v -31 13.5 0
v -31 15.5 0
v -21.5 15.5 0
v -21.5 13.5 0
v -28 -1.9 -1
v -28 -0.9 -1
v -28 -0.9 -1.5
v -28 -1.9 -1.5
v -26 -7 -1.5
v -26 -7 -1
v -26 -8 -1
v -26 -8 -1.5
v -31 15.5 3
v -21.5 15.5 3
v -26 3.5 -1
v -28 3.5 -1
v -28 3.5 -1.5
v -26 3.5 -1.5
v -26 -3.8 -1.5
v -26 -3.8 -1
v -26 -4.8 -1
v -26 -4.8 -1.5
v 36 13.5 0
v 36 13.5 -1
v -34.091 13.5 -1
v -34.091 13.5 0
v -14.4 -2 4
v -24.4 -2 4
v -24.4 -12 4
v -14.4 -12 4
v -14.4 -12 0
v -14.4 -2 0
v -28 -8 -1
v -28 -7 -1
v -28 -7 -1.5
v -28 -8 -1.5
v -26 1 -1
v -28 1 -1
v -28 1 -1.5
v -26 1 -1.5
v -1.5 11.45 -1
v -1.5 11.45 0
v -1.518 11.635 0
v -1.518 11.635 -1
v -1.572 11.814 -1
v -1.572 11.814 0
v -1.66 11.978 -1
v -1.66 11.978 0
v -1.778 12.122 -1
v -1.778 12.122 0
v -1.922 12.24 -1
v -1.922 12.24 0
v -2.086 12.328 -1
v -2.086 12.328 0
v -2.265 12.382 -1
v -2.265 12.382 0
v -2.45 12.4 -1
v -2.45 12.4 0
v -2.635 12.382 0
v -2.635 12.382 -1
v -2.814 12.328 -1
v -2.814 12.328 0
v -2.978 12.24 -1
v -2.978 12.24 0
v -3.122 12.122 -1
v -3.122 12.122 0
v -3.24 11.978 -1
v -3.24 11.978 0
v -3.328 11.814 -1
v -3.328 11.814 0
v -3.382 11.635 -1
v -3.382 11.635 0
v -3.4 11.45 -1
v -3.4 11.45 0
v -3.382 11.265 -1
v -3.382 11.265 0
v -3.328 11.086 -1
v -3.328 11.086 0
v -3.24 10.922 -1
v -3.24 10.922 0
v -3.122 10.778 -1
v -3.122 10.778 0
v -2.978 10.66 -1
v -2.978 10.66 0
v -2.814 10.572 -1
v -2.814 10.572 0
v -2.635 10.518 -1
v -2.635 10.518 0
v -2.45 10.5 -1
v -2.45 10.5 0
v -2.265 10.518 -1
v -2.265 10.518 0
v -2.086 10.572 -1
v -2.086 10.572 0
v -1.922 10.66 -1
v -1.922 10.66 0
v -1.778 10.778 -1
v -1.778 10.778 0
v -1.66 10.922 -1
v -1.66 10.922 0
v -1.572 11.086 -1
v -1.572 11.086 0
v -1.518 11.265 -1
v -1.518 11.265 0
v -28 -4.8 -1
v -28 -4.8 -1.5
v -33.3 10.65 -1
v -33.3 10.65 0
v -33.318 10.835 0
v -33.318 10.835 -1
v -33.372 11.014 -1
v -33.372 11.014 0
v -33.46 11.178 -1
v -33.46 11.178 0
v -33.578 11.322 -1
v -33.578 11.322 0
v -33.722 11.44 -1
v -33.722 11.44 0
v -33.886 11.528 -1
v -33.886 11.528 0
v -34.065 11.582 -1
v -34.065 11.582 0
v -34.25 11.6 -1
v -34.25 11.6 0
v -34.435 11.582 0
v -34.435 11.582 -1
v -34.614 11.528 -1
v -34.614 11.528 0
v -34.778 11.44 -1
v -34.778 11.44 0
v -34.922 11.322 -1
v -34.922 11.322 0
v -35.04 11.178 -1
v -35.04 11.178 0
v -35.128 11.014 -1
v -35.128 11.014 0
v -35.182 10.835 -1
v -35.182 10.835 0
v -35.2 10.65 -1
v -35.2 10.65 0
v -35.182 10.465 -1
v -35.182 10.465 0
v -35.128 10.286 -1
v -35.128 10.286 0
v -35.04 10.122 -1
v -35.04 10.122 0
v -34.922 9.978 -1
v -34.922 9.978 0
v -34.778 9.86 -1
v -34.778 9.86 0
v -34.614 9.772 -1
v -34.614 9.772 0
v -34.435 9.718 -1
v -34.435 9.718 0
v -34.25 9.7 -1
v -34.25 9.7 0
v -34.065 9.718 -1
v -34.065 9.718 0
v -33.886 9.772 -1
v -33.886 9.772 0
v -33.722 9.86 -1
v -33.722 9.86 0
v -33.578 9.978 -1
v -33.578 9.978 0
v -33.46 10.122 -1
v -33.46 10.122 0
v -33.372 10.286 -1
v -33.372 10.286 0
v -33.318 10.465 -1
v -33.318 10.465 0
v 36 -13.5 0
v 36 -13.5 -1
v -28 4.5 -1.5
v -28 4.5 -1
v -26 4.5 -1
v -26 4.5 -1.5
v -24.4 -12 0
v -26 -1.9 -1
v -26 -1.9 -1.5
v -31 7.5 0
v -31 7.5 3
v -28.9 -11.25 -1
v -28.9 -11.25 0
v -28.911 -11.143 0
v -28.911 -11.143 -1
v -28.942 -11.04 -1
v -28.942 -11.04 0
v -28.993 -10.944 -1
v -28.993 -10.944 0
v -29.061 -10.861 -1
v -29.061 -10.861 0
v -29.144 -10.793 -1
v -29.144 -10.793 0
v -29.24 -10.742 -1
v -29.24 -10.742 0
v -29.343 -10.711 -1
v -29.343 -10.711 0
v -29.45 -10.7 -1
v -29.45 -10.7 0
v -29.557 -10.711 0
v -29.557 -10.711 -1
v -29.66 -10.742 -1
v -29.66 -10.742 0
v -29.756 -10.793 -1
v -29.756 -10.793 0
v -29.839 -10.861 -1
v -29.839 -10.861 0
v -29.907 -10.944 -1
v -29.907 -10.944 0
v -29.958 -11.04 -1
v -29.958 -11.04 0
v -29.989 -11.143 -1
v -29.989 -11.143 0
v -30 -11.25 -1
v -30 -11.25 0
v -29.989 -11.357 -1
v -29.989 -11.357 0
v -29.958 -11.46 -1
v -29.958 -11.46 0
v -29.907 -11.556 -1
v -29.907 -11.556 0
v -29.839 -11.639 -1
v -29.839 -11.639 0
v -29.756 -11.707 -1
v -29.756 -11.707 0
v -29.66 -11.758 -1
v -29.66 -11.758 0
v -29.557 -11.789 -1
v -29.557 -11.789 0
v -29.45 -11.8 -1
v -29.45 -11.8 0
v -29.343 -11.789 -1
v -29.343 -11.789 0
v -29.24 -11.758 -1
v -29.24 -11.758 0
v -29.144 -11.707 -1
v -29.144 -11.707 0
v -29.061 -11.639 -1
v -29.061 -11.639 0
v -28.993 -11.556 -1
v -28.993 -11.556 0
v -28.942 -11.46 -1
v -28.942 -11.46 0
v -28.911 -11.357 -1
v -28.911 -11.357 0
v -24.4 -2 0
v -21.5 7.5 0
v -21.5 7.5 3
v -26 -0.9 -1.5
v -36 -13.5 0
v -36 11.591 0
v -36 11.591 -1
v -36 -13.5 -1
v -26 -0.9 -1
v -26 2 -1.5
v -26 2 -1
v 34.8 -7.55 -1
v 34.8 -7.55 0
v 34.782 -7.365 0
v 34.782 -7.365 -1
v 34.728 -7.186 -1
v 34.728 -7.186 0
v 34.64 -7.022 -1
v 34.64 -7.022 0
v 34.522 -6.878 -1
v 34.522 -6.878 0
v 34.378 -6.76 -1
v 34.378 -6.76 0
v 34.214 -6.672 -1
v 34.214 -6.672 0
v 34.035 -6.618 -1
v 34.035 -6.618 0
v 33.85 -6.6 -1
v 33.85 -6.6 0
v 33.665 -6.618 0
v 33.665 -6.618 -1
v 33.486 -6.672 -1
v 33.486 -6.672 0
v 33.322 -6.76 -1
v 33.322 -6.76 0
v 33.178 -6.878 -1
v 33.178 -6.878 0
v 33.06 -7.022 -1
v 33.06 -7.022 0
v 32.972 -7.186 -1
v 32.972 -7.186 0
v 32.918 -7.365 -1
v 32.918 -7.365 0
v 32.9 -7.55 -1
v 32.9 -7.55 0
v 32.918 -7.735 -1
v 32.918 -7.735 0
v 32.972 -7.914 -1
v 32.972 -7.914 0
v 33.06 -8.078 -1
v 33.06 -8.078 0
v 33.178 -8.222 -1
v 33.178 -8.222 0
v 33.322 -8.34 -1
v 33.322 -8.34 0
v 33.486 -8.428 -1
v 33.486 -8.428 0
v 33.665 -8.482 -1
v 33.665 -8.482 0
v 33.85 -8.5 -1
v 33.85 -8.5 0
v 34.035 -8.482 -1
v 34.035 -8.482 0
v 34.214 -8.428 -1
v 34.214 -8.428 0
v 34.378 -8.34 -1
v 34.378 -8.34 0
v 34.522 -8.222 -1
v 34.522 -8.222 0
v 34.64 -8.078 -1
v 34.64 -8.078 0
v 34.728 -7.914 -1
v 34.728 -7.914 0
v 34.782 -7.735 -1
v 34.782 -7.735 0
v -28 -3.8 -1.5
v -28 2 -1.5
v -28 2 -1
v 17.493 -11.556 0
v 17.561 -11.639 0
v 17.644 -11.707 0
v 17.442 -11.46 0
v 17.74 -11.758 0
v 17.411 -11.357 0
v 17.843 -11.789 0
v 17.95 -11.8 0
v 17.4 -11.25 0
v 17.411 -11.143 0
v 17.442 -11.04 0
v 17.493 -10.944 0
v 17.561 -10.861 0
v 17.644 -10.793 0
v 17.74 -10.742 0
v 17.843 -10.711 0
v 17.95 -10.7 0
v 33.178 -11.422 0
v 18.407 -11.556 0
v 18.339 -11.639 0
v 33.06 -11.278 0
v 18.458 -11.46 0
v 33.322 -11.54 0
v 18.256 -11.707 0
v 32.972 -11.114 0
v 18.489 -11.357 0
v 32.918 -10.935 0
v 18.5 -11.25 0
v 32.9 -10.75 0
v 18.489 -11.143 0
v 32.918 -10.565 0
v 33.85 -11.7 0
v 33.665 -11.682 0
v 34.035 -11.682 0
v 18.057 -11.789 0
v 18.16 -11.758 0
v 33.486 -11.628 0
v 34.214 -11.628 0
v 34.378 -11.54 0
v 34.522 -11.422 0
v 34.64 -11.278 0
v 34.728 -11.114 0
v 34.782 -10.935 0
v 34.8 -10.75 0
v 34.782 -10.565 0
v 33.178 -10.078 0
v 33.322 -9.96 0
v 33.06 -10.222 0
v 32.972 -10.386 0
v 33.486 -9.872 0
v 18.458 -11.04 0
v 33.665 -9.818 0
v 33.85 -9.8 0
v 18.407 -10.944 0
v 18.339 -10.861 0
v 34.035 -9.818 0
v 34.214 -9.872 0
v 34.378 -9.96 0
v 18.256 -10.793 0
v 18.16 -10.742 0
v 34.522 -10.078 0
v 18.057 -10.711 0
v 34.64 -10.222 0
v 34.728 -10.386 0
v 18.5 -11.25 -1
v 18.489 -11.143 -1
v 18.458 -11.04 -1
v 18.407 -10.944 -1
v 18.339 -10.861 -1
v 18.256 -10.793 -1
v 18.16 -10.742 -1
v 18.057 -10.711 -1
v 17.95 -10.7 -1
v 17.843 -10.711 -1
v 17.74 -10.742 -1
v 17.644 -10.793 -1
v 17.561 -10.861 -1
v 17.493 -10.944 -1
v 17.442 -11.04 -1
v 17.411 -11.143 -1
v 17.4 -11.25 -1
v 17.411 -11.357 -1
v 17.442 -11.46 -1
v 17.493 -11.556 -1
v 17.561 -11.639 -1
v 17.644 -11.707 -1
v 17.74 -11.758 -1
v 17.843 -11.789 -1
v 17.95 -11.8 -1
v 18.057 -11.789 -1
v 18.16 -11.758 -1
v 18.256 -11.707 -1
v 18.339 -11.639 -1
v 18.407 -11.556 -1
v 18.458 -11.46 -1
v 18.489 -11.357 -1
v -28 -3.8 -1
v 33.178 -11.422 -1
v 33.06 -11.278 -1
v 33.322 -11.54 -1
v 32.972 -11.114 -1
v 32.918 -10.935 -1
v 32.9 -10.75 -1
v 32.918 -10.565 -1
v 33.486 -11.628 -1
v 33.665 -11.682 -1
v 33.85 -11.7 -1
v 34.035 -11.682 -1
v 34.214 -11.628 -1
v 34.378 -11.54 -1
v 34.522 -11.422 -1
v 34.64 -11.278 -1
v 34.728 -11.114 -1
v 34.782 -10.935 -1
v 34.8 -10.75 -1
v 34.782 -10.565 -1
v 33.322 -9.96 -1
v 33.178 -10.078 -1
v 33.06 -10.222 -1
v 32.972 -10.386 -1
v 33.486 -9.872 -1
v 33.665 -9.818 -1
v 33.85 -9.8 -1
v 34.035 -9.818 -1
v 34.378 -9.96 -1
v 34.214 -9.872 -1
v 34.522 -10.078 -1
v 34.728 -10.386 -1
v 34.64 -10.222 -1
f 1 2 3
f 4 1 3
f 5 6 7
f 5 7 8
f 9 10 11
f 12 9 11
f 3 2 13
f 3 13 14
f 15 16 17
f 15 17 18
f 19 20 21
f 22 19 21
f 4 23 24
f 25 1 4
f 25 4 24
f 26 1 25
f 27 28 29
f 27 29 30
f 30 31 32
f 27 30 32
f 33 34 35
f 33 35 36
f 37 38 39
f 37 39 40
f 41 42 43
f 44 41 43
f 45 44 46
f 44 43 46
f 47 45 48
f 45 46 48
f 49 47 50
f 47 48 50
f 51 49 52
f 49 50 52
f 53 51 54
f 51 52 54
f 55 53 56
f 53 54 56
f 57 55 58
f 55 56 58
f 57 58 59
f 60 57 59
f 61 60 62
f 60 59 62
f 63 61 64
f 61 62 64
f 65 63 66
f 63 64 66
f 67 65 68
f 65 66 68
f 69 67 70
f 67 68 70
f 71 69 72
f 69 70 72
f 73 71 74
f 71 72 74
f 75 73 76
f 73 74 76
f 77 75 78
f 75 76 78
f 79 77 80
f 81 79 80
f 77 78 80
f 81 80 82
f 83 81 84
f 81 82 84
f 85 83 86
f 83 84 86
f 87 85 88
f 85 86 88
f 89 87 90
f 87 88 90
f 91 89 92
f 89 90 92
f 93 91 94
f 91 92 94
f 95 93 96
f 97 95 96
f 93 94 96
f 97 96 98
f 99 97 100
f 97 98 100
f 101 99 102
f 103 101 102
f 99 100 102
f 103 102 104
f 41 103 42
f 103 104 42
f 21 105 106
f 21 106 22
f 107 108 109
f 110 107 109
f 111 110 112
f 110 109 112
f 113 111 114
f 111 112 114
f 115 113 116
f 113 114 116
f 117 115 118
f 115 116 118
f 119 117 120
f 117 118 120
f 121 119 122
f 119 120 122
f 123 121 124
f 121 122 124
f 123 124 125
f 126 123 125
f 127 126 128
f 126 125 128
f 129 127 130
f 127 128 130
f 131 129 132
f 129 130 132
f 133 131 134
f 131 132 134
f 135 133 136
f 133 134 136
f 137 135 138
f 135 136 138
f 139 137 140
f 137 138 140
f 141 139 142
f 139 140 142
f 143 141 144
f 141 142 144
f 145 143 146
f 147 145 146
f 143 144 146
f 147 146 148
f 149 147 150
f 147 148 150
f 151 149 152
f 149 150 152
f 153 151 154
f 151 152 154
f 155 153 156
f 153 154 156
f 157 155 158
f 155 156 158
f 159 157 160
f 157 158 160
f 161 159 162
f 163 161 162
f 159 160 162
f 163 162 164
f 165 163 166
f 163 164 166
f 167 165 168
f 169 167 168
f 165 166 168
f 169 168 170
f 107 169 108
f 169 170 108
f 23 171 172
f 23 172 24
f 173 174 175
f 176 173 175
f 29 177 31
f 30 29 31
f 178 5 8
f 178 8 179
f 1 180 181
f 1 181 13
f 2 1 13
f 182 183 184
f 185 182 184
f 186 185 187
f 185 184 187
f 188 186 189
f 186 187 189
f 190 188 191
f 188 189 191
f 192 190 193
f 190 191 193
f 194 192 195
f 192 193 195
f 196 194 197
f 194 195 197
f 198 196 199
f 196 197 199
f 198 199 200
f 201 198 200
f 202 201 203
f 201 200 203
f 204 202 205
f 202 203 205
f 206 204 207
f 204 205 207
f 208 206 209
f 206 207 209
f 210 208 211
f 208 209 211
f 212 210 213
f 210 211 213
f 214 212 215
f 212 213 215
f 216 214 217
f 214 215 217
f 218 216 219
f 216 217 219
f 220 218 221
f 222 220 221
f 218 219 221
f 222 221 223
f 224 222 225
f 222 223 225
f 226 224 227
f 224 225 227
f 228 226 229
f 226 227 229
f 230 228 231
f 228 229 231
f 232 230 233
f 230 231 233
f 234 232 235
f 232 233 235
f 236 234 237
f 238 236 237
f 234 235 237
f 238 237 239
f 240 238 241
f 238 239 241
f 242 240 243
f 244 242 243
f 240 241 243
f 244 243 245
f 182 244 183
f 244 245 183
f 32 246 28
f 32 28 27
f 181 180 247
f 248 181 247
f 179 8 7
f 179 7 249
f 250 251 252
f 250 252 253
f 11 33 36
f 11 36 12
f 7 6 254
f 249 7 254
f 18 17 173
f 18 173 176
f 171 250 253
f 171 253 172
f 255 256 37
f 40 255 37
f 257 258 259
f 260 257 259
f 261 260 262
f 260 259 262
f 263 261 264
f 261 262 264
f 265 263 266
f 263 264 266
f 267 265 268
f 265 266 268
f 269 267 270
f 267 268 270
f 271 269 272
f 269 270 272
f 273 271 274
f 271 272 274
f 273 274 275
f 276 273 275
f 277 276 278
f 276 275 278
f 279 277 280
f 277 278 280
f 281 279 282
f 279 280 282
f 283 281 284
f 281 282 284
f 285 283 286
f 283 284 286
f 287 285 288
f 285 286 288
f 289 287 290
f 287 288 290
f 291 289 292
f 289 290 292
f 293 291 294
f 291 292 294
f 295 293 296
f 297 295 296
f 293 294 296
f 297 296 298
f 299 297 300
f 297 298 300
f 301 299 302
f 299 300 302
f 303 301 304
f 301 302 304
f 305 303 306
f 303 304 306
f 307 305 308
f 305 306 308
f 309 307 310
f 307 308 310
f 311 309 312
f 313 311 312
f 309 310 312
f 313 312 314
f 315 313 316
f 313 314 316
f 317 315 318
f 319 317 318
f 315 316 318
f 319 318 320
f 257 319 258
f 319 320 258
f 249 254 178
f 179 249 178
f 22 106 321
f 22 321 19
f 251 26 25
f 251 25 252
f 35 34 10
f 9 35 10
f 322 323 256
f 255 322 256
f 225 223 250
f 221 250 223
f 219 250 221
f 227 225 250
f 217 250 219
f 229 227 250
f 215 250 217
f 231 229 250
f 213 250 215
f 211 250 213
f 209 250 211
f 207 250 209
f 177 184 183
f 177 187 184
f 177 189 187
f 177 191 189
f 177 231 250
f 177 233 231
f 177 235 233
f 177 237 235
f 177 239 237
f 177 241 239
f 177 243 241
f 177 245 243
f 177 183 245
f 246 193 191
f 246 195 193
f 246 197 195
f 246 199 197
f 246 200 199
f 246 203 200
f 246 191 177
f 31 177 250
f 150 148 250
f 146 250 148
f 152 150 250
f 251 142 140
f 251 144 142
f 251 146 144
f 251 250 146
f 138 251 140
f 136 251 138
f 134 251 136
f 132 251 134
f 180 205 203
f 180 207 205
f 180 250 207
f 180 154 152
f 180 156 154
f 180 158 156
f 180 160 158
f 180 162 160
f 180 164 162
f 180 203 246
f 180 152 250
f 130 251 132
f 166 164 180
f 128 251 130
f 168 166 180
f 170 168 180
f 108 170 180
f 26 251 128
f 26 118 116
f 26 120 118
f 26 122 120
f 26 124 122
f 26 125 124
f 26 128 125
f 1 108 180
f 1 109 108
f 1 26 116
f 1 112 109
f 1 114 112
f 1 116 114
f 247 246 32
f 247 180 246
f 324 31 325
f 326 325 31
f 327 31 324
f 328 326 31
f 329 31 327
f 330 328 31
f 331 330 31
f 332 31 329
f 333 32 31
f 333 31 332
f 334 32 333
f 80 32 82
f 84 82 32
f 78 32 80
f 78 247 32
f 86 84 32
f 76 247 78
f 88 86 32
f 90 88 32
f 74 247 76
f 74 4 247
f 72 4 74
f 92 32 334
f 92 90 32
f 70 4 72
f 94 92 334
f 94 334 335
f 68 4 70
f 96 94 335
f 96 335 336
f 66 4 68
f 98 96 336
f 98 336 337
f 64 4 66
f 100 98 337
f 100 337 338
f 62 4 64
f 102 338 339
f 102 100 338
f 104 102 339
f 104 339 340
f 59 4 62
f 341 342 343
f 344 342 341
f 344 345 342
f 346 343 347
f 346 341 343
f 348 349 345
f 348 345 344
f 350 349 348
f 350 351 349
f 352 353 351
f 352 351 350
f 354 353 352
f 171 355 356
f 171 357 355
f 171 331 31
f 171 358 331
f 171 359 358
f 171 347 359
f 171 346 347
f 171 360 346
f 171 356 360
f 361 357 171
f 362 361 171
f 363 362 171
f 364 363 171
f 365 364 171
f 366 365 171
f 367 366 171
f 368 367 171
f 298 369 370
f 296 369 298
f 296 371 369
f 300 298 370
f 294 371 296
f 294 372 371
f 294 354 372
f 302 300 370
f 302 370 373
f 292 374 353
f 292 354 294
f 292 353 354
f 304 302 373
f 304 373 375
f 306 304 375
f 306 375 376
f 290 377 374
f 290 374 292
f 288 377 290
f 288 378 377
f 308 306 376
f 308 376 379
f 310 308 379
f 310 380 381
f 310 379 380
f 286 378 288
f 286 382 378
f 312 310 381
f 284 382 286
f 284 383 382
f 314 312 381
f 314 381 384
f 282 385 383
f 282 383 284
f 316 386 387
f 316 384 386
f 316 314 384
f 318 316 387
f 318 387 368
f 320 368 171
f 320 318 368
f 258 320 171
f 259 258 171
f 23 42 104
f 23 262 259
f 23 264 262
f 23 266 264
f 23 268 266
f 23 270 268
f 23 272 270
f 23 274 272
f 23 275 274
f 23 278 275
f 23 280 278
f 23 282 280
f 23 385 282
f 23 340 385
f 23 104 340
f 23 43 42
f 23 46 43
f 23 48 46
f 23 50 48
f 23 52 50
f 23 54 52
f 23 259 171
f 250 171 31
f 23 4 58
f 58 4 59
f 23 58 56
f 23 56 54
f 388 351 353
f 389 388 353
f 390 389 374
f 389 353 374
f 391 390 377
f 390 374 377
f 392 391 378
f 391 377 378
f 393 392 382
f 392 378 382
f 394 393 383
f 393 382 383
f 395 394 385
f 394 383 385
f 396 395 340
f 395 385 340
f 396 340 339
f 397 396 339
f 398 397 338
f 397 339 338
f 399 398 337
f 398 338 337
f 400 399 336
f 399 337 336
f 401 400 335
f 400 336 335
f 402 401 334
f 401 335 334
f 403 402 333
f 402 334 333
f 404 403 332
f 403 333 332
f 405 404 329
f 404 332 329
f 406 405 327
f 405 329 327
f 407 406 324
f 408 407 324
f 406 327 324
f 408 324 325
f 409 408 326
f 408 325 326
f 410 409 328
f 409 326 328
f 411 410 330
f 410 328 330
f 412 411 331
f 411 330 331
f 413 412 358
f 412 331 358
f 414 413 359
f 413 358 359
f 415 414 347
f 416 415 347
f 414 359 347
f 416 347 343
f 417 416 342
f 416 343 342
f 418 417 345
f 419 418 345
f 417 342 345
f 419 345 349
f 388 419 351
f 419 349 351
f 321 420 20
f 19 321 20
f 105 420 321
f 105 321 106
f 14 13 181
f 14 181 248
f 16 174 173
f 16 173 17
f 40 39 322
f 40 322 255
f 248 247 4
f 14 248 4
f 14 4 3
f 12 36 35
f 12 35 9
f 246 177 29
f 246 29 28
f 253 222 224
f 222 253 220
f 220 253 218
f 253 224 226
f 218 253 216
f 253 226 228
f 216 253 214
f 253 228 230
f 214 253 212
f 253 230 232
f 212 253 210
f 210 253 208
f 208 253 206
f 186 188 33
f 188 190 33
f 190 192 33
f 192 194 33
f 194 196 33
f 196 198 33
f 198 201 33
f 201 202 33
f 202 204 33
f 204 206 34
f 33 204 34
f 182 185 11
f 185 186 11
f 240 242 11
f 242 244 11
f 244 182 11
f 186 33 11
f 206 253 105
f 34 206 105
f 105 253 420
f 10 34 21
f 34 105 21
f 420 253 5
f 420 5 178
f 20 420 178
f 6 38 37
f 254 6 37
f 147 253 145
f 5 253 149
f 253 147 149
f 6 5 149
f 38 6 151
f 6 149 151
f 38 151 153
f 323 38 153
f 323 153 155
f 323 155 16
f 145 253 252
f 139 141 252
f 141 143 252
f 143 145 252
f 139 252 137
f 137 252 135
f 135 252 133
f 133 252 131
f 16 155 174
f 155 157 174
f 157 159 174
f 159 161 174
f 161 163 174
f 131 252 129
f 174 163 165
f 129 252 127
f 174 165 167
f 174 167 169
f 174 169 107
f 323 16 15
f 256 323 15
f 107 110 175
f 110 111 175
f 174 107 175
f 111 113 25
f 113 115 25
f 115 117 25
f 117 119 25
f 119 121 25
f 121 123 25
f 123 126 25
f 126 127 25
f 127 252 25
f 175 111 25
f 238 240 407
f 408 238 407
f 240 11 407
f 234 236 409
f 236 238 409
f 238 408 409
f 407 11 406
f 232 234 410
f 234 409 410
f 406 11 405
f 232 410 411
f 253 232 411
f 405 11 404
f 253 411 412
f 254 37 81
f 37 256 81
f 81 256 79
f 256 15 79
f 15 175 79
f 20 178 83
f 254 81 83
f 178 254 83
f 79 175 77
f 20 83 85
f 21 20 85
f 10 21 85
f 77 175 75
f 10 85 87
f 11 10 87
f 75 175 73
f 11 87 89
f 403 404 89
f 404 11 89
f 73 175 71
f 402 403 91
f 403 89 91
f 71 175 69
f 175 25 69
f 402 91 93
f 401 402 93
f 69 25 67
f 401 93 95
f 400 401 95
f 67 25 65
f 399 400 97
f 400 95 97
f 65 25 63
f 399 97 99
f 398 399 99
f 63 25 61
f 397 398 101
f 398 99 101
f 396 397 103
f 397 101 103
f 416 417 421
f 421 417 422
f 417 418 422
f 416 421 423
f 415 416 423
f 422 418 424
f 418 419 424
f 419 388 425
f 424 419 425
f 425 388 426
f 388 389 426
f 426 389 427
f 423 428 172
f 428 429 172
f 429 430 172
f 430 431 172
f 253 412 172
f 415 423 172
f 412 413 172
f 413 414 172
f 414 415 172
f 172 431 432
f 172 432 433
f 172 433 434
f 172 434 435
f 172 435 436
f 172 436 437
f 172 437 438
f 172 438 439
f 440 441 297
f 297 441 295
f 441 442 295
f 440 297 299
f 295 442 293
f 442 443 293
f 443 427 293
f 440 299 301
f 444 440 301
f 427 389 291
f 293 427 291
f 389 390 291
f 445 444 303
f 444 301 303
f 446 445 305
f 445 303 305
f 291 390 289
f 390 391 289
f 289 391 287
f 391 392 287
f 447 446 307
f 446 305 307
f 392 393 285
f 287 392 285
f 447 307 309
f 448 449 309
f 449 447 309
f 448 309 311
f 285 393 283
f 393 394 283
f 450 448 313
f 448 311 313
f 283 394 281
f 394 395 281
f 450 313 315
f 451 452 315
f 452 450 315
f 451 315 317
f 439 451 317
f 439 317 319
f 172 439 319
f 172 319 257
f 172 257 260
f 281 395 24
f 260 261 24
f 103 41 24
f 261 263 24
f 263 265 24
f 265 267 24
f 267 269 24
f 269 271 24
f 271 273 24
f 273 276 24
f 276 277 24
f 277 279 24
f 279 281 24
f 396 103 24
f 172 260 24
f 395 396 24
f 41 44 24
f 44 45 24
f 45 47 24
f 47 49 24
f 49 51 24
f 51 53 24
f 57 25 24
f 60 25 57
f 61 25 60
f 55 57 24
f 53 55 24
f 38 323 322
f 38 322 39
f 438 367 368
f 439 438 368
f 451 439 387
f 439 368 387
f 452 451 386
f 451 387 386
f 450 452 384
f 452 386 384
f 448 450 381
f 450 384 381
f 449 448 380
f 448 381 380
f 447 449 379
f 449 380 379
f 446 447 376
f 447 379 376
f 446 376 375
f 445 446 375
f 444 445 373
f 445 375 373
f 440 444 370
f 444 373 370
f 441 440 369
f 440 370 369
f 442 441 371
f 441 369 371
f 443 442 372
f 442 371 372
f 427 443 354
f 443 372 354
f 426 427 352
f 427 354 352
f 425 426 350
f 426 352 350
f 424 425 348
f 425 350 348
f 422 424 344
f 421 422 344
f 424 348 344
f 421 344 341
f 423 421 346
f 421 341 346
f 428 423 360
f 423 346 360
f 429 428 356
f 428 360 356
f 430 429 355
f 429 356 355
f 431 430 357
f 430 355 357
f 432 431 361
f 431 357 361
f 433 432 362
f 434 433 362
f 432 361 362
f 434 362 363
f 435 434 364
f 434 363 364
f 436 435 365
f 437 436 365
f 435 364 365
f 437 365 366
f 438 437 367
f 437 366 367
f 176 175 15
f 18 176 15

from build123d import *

# Parameters (mm, degrees)
SKETCH_R     = 0.95
SKETCH_R_2   = 0.55
PAD_DEPTH    = 1
SKETCH001_W  = 10
SKETCH001_H  = 10
PAD001_DEPTH = 4
SKETCH002_W  = 2
SKETCH002_H  = 1
PAD002_DEPTH = 0.5
SKETCH006_W  = 9.5
SKETCH006_H  = 8
PAD006_DEPTH = 3


with BuildPart() as part:
    # Sketch → Pad (new body)
    with BuildSketch(Plane.XY):
        Polygon((-36, -13.5), (36, -13.5), (36, 13.5), (-34.090812, 13.5), (-36, 11.590812), align=None)
        with Locations((-34.25, 10.65)):
            Circle(SKETCH_R, mode=Mode.SUBTRACT)
        with Locations((33.85, -7.55)):
            Circle(SKETCH_R, mode=Mode.SUBTRACT)
        with Locations((33.85, -10.75)):
            Circle(SKETCH_R, mode=Mode.SUBTRACT)
        with Locations((-2.45, 11.45)):
            Circle(SKETCH_R, mode=Mode.SUBTRACT)
        with Locations((-29.45, -11.25)):
            Circle(SKETCH_R_2, mode=Mode.SUBTRACT)
        with Locations((17.95, -11.25)):
            Circle(SKETCH_R_2, mode=Mode.SUBTRACT)
    extrude(amount=-PAD_DEPTH)

    # Sketch001 (on Face12 of Pad) → Pad001 (join)
    with BuildSketch(Plane.XY):
        with Locations((-19.4, -7)):
            Rectangle(SKETCH001_W, SKETCH001_H)
    extrude(amount=PAD001_DEPTH)

    # Sketch002 (on Face5 of Pad001) → Pad002 (join)
    with BuildSketch(Plane(origin=(0, 0, -1), x_dir=(1, 0, 0), z_dir=(0, 0, -1))):
        with Locations((-27, 7.5)):
            Rectangle(SKETCH002_W, SKETCH002_H)
        with Locations((-27, 4.3)):
            Rectangle(SKETCH002_W, SKETCH002_H)
        with Locations((-27, 1.4)):
            Rectangle(SKETCH002_W, SKETCH002_H)
        with Locations((-27, -1.5)):
            Rectangle(SKETCH002_W, SKETCH002_H)
        with Locations((-27, -4)):
            Rectangle(SKETCH002_W, SKETCH002_H)
    extrude(amount=PAD002_DEPTH)

    # Sketch006 (on Face4 of Pad002) → Pad006 (join)
    with BuildSketch(Plane.XY):
        with Locations((-26.25, 11.5)):
            Rectangle(SKETCH006_W, SKETCH006_H)
    extrude(amount=PAD006_DEPTH)


solid = part.part
